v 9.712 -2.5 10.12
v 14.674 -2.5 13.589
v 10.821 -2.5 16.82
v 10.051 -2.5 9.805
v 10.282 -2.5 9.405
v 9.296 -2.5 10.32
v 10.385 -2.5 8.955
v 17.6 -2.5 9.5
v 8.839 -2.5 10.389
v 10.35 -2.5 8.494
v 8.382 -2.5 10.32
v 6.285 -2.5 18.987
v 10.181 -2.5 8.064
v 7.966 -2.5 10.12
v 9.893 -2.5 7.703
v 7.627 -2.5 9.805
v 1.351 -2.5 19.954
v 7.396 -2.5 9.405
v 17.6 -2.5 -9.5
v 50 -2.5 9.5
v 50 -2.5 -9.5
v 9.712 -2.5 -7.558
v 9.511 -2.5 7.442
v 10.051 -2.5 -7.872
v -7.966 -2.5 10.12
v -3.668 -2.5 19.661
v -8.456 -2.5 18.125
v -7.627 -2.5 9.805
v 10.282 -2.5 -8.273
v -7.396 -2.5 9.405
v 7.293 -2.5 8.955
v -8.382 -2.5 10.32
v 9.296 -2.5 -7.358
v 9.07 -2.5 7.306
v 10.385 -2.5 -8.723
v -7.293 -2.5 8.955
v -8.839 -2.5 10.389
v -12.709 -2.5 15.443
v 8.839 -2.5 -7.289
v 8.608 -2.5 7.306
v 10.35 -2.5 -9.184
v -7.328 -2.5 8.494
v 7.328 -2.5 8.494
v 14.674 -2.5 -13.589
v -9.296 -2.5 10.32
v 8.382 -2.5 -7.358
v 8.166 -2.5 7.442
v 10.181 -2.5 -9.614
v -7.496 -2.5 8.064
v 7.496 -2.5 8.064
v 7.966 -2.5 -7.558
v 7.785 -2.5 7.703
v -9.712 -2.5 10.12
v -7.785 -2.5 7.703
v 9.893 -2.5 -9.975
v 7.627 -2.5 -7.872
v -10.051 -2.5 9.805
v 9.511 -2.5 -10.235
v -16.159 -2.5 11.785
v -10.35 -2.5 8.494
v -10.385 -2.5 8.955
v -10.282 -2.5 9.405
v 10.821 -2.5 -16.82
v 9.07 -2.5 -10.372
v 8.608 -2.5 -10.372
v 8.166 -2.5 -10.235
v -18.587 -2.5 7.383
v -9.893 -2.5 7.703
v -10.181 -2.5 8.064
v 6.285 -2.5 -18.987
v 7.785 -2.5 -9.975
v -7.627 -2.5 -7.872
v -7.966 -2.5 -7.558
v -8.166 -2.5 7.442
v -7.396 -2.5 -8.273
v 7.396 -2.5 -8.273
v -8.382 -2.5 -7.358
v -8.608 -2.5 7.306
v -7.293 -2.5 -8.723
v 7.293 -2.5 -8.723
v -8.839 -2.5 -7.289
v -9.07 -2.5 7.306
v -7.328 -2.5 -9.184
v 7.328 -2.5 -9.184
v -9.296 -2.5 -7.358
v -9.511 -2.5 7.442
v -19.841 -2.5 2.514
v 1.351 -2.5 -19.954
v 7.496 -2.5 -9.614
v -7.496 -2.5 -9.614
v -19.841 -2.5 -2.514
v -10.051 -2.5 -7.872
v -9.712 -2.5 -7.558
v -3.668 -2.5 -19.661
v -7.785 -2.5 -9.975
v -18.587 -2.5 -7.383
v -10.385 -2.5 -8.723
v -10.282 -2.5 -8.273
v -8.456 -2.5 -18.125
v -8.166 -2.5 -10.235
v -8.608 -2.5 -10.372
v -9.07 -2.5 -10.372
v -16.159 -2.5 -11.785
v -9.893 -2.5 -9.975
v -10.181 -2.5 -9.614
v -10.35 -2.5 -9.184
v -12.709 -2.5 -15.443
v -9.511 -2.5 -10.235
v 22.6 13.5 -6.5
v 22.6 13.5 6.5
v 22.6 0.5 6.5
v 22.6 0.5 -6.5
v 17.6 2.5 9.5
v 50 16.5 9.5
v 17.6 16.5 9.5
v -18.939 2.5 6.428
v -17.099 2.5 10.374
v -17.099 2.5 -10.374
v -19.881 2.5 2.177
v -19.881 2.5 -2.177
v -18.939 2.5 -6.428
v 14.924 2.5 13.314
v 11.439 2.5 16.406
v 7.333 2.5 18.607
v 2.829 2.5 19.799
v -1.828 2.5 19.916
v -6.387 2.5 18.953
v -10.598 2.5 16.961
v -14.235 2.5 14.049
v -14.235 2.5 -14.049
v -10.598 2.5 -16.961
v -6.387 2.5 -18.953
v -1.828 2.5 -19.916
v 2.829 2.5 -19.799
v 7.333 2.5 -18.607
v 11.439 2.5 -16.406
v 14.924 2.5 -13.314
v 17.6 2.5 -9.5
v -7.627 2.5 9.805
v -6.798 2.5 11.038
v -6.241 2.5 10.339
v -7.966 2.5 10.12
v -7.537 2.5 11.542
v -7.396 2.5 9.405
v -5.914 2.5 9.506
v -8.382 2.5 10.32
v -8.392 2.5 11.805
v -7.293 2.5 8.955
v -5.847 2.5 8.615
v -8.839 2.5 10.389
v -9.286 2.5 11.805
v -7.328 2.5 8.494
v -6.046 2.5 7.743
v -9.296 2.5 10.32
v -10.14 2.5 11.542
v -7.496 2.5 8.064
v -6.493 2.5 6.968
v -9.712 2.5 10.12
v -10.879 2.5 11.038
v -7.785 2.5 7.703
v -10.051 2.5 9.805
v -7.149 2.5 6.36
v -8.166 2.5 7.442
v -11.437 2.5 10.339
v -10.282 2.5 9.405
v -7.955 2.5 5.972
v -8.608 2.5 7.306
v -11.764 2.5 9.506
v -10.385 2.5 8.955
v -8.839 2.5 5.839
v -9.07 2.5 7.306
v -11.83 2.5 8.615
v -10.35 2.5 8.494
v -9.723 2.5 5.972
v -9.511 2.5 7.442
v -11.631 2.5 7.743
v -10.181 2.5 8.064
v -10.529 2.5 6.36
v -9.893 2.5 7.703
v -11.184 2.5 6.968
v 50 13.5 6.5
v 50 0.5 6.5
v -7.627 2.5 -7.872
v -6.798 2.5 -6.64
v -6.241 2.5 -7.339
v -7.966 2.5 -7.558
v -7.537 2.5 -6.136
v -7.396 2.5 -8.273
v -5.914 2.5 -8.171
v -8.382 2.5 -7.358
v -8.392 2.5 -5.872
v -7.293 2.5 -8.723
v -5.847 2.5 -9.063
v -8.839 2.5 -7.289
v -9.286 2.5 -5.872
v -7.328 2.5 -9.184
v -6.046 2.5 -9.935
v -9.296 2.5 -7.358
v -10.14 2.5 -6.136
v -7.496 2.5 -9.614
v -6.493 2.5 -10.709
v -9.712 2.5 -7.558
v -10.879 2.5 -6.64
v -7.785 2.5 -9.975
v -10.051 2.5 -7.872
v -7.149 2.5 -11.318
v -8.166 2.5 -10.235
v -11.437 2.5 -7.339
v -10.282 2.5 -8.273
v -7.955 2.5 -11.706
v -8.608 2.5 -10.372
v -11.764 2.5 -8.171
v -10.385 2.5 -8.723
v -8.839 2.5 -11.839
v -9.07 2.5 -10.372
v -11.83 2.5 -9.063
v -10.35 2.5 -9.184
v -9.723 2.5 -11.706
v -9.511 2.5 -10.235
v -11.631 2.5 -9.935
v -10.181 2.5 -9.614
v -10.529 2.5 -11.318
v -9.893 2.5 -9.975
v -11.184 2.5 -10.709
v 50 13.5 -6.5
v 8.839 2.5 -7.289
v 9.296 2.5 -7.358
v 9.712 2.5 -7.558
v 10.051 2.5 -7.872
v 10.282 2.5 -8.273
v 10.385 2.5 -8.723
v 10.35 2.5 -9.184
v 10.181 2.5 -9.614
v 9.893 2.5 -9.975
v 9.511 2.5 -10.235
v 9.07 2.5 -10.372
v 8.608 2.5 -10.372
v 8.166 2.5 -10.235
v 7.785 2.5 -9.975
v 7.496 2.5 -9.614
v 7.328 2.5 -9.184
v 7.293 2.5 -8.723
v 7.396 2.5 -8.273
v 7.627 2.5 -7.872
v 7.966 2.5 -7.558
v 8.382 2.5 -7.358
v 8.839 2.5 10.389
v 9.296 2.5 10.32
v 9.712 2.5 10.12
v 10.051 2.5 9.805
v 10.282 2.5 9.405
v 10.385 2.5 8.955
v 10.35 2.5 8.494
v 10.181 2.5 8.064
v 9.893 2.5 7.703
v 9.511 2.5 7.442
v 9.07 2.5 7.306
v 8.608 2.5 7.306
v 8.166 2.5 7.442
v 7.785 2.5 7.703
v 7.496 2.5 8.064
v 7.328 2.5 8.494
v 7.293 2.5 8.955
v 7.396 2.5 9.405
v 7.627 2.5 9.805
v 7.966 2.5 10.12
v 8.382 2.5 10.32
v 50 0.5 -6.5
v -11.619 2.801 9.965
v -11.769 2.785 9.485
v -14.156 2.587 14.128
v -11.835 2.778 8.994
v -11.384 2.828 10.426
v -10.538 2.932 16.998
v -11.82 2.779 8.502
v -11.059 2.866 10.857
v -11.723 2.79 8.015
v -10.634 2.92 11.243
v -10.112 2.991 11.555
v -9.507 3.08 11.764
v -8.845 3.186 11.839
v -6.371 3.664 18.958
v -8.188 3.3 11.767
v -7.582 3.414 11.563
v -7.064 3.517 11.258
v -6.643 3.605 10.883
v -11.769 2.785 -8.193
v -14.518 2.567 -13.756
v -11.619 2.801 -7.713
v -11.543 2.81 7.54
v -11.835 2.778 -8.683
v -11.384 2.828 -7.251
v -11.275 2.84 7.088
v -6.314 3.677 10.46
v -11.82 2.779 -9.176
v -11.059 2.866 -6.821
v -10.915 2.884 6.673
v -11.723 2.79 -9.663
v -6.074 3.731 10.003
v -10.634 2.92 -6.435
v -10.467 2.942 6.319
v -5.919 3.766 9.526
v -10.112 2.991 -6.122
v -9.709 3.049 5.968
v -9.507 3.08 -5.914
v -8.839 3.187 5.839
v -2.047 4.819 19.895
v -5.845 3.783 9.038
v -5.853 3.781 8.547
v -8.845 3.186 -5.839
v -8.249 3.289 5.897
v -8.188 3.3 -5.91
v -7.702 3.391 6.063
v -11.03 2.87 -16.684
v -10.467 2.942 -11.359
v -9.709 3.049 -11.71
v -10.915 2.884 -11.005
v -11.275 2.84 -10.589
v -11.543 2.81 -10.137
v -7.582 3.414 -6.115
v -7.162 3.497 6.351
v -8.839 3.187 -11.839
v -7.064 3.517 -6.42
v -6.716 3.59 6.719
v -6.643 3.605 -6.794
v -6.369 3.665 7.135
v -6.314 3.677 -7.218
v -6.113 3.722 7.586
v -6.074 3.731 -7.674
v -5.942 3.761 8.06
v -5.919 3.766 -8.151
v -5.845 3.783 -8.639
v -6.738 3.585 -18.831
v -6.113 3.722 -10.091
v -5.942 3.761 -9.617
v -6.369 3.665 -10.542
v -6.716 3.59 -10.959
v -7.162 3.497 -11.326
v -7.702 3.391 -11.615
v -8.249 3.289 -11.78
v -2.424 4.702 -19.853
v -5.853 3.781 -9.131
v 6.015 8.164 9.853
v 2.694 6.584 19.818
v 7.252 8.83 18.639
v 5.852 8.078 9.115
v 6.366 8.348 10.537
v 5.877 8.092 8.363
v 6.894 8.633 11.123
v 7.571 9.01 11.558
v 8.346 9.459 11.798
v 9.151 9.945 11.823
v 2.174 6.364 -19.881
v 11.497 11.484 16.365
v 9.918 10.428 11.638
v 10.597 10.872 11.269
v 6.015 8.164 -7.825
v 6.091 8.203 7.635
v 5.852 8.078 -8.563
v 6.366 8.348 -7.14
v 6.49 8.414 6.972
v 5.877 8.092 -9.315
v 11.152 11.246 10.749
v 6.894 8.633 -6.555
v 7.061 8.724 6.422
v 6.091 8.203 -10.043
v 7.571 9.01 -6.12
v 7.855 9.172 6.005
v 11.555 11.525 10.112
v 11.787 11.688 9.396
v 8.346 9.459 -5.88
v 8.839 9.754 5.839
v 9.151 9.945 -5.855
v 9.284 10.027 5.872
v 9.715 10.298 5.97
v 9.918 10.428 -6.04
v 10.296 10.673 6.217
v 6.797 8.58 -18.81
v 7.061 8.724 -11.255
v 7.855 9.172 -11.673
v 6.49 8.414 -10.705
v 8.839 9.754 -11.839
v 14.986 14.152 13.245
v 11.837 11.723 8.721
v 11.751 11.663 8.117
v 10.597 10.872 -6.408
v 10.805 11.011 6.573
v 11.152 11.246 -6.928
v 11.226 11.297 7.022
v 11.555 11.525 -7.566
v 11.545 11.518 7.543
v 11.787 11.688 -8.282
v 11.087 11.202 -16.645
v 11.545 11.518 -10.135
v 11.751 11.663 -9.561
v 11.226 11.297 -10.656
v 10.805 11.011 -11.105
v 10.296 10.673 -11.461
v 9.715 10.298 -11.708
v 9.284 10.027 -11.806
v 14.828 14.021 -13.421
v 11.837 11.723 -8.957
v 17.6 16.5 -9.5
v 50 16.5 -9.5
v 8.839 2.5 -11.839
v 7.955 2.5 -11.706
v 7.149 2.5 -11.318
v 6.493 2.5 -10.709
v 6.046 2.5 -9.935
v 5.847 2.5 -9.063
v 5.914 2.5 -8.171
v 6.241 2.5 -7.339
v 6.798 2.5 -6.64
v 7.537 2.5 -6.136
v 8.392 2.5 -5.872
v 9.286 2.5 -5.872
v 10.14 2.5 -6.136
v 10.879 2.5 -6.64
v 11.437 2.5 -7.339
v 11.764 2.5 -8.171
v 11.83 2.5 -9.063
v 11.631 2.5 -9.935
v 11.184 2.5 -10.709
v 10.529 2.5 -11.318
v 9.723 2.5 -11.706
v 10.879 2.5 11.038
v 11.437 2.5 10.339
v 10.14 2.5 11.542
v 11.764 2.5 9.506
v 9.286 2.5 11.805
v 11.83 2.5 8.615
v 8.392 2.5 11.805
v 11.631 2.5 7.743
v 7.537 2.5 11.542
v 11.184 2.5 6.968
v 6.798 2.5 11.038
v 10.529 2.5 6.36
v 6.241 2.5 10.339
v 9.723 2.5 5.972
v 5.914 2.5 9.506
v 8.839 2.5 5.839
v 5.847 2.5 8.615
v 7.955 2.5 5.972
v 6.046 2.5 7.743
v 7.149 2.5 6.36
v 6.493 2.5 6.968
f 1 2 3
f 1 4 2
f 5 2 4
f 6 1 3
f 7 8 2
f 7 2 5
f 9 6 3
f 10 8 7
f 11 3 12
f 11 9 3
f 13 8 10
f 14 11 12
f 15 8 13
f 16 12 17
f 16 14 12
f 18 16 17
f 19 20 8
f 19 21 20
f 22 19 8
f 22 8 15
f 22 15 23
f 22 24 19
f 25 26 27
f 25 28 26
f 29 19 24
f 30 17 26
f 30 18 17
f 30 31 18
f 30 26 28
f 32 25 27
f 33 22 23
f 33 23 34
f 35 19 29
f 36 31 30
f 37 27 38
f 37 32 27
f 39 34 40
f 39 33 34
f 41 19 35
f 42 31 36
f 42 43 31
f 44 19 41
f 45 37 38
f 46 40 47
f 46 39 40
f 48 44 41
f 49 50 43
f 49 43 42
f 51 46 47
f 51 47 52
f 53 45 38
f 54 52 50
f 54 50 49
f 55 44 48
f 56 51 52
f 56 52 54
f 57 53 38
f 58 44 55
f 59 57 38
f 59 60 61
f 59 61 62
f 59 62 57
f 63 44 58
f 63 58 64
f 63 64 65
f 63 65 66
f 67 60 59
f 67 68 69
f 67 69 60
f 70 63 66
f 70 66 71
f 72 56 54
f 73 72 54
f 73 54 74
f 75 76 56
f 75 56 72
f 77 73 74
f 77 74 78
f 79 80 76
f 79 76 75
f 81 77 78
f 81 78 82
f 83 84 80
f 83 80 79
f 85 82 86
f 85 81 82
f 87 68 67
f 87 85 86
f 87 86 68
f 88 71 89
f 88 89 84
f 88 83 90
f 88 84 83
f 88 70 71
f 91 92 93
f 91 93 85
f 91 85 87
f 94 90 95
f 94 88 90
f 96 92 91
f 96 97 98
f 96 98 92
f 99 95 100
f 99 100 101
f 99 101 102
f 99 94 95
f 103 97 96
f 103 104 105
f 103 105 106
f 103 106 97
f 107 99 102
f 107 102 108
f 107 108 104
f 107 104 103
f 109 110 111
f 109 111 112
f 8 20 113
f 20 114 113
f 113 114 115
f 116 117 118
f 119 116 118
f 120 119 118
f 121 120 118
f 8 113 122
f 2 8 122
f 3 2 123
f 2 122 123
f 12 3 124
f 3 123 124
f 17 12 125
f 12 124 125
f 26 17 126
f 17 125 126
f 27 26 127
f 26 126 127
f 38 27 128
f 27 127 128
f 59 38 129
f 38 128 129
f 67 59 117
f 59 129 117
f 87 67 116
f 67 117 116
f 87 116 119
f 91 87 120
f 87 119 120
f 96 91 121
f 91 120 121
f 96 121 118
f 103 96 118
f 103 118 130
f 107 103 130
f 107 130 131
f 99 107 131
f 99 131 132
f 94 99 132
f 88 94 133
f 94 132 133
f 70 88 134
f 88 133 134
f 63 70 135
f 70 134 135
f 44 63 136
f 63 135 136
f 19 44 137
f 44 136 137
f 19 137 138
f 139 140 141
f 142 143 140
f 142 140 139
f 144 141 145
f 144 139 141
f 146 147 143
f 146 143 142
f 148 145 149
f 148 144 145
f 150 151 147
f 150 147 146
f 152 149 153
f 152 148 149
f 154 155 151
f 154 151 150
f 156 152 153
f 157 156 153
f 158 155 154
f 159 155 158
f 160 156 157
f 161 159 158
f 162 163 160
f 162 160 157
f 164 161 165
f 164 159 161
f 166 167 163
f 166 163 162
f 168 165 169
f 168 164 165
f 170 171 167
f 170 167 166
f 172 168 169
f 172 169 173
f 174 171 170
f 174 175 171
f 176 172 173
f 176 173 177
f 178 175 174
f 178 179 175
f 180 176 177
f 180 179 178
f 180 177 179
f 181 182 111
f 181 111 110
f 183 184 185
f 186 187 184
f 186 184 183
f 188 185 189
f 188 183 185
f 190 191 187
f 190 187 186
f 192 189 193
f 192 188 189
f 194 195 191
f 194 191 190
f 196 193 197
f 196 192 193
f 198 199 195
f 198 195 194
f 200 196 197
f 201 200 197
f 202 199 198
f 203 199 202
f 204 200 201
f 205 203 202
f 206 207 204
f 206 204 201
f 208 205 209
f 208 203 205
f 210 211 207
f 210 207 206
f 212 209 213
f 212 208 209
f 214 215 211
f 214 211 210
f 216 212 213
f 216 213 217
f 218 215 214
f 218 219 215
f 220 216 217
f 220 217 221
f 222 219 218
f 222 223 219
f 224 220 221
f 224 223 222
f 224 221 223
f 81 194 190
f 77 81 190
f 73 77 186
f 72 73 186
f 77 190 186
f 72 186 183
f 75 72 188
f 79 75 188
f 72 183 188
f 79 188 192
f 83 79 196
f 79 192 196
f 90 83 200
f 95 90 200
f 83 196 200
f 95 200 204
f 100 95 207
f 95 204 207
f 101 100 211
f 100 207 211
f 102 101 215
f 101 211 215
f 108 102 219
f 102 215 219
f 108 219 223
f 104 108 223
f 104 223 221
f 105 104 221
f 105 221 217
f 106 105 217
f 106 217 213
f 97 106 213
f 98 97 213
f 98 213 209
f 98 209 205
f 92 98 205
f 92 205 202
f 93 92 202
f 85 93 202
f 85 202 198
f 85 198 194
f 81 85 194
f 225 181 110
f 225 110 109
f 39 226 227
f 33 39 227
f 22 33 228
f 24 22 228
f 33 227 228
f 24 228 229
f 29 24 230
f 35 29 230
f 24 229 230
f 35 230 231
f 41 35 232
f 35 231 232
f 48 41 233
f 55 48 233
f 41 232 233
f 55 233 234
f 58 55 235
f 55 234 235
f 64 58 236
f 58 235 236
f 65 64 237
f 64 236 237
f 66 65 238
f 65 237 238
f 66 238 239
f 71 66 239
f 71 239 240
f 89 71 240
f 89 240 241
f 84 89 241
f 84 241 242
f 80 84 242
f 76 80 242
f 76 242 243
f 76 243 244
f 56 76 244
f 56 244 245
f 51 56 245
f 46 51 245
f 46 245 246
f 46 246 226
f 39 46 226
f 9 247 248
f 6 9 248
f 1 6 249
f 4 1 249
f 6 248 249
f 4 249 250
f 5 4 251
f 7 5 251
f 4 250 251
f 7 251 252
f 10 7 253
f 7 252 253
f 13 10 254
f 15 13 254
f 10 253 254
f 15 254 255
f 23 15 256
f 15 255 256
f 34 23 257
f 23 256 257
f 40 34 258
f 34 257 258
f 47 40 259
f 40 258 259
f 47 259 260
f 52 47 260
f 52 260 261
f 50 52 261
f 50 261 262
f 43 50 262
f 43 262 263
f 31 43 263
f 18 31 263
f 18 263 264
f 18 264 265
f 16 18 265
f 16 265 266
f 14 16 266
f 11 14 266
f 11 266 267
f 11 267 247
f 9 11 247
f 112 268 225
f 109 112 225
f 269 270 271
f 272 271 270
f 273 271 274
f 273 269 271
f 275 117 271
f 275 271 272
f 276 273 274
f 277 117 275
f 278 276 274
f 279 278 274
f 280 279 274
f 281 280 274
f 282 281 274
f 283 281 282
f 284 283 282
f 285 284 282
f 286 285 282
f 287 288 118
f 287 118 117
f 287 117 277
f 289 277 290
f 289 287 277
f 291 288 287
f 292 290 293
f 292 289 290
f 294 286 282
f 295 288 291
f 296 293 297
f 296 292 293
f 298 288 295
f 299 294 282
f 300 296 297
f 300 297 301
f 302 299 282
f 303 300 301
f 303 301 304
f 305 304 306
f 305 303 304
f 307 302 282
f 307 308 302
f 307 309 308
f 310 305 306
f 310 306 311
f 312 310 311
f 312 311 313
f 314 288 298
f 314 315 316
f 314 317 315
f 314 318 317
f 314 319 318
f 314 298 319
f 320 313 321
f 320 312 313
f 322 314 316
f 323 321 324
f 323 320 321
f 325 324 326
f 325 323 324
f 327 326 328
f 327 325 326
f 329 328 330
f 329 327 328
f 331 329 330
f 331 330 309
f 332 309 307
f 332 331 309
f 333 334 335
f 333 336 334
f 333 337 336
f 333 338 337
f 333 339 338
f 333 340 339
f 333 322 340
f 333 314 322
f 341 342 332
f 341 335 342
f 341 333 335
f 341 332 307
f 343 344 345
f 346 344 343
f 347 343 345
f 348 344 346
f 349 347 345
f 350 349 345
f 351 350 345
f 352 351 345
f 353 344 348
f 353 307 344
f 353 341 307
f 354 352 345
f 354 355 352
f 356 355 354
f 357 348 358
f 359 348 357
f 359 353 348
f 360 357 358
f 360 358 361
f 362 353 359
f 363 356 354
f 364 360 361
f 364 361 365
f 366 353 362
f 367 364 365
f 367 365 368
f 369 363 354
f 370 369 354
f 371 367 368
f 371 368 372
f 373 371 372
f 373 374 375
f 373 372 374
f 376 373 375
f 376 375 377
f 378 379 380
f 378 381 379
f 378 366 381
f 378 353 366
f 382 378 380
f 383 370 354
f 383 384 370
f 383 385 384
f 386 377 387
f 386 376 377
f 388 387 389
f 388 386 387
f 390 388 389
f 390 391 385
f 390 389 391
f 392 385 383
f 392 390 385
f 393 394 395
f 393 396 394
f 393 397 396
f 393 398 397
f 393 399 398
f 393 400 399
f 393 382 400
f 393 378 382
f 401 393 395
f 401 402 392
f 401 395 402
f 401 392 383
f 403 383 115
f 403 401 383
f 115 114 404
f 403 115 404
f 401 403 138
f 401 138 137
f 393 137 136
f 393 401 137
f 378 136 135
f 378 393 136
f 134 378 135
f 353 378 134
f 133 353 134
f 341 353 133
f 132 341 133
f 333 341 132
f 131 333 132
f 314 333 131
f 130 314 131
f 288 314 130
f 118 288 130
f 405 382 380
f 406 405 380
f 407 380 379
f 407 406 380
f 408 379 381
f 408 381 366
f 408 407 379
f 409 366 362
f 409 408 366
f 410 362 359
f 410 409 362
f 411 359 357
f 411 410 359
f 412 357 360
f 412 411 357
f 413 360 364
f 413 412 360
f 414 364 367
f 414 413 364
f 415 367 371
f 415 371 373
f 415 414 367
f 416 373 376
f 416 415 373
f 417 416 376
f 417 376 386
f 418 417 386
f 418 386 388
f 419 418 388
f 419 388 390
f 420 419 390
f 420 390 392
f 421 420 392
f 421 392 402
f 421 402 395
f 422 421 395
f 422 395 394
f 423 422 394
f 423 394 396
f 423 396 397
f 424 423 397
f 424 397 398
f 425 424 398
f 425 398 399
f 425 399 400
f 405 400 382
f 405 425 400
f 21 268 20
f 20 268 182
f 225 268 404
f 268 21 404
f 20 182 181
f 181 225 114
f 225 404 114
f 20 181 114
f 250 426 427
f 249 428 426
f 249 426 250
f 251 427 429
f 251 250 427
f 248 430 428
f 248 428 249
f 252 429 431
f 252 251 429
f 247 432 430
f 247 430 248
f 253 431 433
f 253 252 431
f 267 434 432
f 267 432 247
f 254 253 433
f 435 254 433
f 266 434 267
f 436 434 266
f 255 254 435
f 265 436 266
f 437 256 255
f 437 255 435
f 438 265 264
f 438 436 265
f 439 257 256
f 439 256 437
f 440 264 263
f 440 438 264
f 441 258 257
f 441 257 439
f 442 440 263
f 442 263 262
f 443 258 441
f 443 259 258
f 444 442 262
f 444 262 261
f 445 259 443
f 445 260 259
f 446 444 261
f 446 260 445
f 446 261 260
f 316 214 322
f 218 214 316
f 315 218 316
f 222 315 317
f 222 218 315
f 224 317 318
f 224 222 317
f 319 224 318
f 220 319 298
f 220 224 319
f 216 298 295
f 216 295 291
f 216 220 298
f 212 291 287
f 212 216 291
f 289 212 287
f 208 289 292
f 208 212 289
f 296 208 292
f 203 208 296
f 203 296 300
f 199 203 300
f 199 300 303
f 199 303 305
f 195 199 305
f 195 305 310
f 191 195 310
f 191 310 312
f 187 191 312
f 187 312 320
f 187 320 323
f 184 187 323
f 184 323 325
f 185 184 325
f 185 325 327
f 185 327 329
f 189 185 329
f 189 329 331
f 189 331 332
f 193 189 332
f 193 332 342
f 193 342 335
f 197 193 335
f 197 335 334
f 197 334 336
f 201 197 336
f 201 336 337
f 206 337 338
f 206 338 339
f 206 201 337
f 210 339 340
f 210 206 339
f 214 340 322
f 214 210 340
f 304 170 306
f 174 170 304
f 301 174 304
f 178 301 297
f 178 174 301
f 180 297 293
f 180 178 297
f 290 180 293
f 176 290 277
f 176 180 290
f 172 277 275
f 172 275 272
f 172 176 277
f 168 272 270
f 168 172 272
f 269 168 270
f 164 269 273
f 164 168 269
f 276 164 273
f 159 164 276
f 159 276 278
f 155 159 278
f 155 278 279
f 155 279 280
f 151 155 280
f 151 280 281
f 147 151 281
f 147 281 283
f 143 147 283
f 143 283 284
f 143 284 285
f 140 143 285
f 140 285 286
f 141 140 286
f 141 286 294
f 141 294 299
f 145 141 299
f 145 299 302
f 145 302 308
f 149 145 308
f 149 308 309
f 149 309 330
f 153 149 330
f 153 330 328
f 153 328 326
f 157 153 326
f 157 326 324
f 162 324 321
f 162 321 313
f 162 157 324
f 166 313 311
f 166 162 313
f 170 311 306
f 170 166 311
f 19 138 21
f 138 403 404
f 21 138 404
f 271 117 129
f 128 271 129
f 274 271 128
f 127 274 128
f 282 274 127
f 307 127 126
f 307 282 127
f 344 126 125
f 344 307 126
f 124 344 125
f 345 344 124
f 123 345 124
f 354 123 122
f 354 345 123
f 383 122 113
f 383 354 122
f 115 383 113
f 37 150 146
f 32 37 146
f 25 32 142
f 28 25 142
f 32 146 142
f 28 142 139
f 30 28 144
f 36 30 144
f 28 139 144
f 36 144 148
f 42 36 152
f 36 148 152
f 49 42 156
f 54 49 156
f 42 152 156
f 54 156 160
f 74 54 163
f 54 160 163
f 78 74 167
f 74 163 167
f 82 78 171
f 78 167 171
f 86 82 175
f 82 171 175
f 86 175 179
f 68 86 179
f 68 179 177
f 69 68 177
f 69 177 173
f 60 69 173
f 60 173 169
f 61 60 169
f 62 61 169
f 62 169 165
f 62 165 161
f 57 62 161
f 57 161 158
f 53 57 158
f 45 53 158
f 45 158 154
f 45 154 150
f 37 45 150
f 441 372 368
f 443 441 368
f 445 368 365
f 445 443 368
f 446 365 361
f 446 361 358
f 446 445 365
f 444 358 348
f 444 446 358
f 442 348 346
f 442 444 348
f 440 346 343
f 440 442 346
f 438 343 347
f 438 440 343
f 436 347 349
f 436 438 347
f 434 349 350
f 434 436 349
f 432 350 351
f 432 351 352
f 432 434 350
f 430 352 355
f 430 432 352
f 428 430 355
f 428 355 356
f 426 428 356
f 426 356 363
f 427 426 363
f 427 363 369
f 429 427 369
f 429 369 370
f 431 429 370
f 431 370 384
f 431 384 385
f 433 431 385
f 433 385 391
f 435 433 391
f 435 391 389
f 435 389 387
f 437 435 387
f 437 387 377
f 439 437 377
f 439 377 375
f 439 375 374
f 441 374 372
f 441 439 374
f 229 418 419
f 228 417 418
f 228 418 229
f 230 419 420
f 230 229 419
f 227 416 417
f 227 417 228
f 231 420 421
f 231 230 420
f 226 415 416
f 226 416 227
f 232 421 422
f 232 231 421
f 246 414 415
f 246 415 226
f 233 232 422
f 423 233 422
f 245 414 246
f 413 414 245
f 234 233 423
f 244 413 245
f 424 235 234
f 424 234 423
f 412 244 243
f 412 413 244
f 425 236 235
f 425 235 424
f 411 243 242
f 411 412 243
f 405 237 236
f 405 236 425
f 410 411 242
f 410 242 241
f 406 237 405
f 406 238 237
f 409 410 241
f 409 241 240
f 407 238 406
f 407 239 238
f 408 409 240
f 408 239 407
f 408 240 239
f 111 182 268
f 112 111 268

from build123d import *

# Parameters (mm, degrees)
BOSS_EXTRUDE1_DEPTH     = 2.5
SKETCH2_R               = 1.55
CUT_EXTRUDE1_DEPTH      = 2.5
SKETCH6_W               = 19
SKETCH6_H               = 19
BOSS_EXTRUDE3_DEPTH     = 32.400284093
SKETCH8_W               = 13
SKETCH8_H               = 13
CUT_EXTRUDE2_DEPTH      = 27.400284093
FILLET2_R               = 50
CUT_EXTRUDE4_REACH      = 57.642
CUT_EXTRUDE4_END_RADIUS = 50
SKETCH13_R              = 3


with BuildPart() as part:
    # Sketch1 → Boss-Extrude1 (new, symmetric)
    with BuildSketch(Plane(origin=(0, 0, 0), x_dir=(1, 0, 0), z_dir=(0, 1, 0))):
        with BuildLine():
            Line((17.599715907, 9.5), (50, 9.5))
            Line((50, 9.5), (50, -9.5))
            Line((50, -9.5), (17.599715907, -9.5))
            ThreePointArc((17.599715907, -9.5), (-20, 0), (17.599715907, 9.5))
        make_face()
    extrude(amount=BOSS_EXTRUDE1_DEPTH, both=True)

    # Sketch2 → Cut-Extrude1 (cut, symmetric)
    with BuildSketch(Plane(origin=(0, 0, 0), x_dir=(1, 0, 0), z_dir=(0, 1, 0))):
        with Locations(Location((8.838834765, 8.838834765, 0), (0, 0, 270))):
            Circle(SKETCH2_R)
        with Locations(Location((-8.838834765, 8.838834765, 0), (0, 0, 270))):
            Circle(SKETCH2_R)
        with Locations(Location((-8.838834765, -8.838834765, 0), (0, 0, 270))):
            Circle(SKETCH2_R)
        with Locations(Location((8.838834765, -8.838834765, 0), (0, 0, 270))):
            Circle(SKETCH2_R)
    extrude(amount=CUT_EXTRUDE1_DEPTH, both=True, mode=Mode.SUBTRACT)

    # Sketch6 → Boss-Extrude3 (add)
    with BuildSketch(Plane(origin=(50, 0, 0), x_dir=(0, 0, -1), z_dir=(1, 0, 0))):
        with Locations((0, 7)):
            Rectangle(SKETCH6_W, SKETCH6_H)
    extrude(amount=-BOSS_EXTRUDE3_DEPTH)

    # Sketch8 → Cut-Extrude2 (cut)
    with BuildSketch(Plane(origin=(50, 0, 0), x_dir=(0, 0, -1), z_dir=(1, 0, 0))):
        with Locations((0, 7)):
            Rectangle(SKETCH8_W, SKETCH8_H)
    extrude(amount=-CUT_EXTRUDE2_DEPTH, mode=Mode.SUBTRACT)

    # Fillet2
    # the kernel refuses this fillet: 50 mm, written as the material it adds along each edge
    with BuildSketch(Plane(origin=(17.599715907, 2.5, -96.246757864), x_dir=(-1, 0, 0), z_dir=(0, 0, 1))) as fillet2_piece_1_section:
        with BuildLine():
            CenterArc((34.698703146, -50), FILLET2_R, 90, 43.945519562)
            Line((0, -14), (0, 0))
            Line((0, 0), (34.698703146, 0))
        make_face()
    fillet2_piece_1 = extrude(amount=192.493515729, mode=Mode.PRIVATE)
    fillet2_piece_1 = fillet2_piece_1 & Plane(origin=(0, 2.5, 0), x_dir=(0.8799857953399021, 0, 0.47500000000000003), z_dir=(0, 1, 0)) * Cylinder(20, 524, mode=Mode.PRIVATE)
    fillet2_piece_1 = fillet2_piece_1 - Plane(origin=(8.838834765, 2.5, 8.838834765), x_dir=(0, 0, 1), z_dir=(0, 1, 0)) * Cylinder(1.55, 524, mode=Mode.PRIVATE)
    fillet2_piece_1 = fillet2_piece_1 - Plane(origin=(-8.838834765, 2.5, 8.838834765), x_dir=(0, 0, 1), z_dir=(0, 1, 0)) * Cylinder(1.55, 524, mode=Mode.PRIVATE)
    fillet2_piece_1 = fillet2_piece_1 - Plane(origin=(8.838834765, 2.5, -8.838834765), x_dir=(0, 0, 1), z_dir=(0, 1, 0)) * Cylinder(1.55, 524, mode=Mode.PRIVATE)
    fillet2_piece_1 = fillet2_piece_1 - Plane(origin=(-8.838834765, 2.5, -8.838834765), x_dir=(0, 0, 1), z_dir=(0, 1, 0)) * Cylinder(1.55, 524, mode=Mode.PRIVATE)
    add(fillet2_piece_1)

    # Cut-Extrude4: up to this cylinder (the profile starts outside it)
    cut_extrude4_end = Plane(origin=(-17.098987239, 52.5, 0), z_dir=(0, 0, -1)) * Cylinder(CUT_EXTRUDE4_END_RADIUS, 233.96167, mode=Mode.PRIVATE)
    # Sketch13 → Cut-Extrude4 (cut, up to the surface)
    with BuildSketch(Plane(origin=(0, 2.5, 0), x_dir=(1, 0, 0), z_dir=(0, 1, 0)), mode=Mode.PRIVATE) as cut_extrude4_sk1:
        with Locations(Location((-8.838834765, 8.838834765, 0), (0, 0, 90))):
            Circle(SKETCH13_R)
    cut_extrude4_tool1 = extrude(cut_extrude4_sk1.sketch, amount=CUT_EXTRUDE4_REACH, mode=Mode.PRIVATE) - cut_extrude4_end
    add(cut_extrude4_tool1.solids().sort_by_distance((-8.838835, 2.5, -8.838835))[0], mode=Mode.SUBTRACT)
    # Sketch13 → Cut-Extrude4 (cut, up to the surface)
    with BuildSketch(Plane(origin=(0, 2.5, 0), x_dir=(1, 0, 0), z_dir=(0, 1, 0)), mode=Mode.PRIVATE) as cut_extrude4_sk2:
        with Locations(Location((8.838834765, 8.838834765, 0), (0, 0, 90))):
            Circle(SKETCH13_R)
    cut_extrude4_tool2 = extrude(cut_extrude4_sk2.sketch, amount=CUT_EXTRUDE4_REACH, mode=Mode.PRIVATE) - cut_extrude4_end
    add(cut_extrude4_tool2.solids().sort_by_distance((8.838835, 2.5, -8.838835))[0], mode=Mode.SUBTRACT)
    # Sketch13 → Cut-Extrude4 (cut, up to the surface)
    with BuildSketch(Plane(origin=(0, 2.5, 0), x_dir=(1, 0, 0), z_dir=(0, 1, 0)), mode=Mode.PRIVATE) as cut_extrude4_sk3:
        with Locations(Location((-8.838834765, -8.838834765, 0), (0, 0, 90))):
            Circle(SKETCH13_R)
    cut_extrude4_tool3 = extrude(cut_extrude4_sk3.sketch, amount=CUT_EXTRUDE4_REACH, mode=Mode.PRIVATE) - cut_extrude4_end
    add(cut_extrude4_tool3.solids().sort_by_distance((-8.838835, 2.5, 8.838835))[0], mode=Mode.SUBTRACT)
    # Sketch13 → Cut-Extrude4 (cut, up to the surface)
    with BuildSketch(Plane(origin=(0, 2.5, 0), x_dir=(1, 0, 0), z_dir=(0, 1, 0)), mode=Mode.PRIVATE) as cut_extrude4_sk4:
        with Locations(Location((8.838834765, -8.838834765, 0), (0, 0, 90))):
            Circle(SKETCH13_R)
    cut_extrude4_tool4 = extrude(cut_extrude4_sk4.sketch, amount=CUT_EXTRUDE4_REACH, mode=Mode.PRIVATE) - cut_extrude4_end
    add(cut_extrude4_tool4.solids().sort_by_distance((8.838835, 2.5, 8.838835))[0], mode=Mode.SUBTRACT)


solid = part.part
